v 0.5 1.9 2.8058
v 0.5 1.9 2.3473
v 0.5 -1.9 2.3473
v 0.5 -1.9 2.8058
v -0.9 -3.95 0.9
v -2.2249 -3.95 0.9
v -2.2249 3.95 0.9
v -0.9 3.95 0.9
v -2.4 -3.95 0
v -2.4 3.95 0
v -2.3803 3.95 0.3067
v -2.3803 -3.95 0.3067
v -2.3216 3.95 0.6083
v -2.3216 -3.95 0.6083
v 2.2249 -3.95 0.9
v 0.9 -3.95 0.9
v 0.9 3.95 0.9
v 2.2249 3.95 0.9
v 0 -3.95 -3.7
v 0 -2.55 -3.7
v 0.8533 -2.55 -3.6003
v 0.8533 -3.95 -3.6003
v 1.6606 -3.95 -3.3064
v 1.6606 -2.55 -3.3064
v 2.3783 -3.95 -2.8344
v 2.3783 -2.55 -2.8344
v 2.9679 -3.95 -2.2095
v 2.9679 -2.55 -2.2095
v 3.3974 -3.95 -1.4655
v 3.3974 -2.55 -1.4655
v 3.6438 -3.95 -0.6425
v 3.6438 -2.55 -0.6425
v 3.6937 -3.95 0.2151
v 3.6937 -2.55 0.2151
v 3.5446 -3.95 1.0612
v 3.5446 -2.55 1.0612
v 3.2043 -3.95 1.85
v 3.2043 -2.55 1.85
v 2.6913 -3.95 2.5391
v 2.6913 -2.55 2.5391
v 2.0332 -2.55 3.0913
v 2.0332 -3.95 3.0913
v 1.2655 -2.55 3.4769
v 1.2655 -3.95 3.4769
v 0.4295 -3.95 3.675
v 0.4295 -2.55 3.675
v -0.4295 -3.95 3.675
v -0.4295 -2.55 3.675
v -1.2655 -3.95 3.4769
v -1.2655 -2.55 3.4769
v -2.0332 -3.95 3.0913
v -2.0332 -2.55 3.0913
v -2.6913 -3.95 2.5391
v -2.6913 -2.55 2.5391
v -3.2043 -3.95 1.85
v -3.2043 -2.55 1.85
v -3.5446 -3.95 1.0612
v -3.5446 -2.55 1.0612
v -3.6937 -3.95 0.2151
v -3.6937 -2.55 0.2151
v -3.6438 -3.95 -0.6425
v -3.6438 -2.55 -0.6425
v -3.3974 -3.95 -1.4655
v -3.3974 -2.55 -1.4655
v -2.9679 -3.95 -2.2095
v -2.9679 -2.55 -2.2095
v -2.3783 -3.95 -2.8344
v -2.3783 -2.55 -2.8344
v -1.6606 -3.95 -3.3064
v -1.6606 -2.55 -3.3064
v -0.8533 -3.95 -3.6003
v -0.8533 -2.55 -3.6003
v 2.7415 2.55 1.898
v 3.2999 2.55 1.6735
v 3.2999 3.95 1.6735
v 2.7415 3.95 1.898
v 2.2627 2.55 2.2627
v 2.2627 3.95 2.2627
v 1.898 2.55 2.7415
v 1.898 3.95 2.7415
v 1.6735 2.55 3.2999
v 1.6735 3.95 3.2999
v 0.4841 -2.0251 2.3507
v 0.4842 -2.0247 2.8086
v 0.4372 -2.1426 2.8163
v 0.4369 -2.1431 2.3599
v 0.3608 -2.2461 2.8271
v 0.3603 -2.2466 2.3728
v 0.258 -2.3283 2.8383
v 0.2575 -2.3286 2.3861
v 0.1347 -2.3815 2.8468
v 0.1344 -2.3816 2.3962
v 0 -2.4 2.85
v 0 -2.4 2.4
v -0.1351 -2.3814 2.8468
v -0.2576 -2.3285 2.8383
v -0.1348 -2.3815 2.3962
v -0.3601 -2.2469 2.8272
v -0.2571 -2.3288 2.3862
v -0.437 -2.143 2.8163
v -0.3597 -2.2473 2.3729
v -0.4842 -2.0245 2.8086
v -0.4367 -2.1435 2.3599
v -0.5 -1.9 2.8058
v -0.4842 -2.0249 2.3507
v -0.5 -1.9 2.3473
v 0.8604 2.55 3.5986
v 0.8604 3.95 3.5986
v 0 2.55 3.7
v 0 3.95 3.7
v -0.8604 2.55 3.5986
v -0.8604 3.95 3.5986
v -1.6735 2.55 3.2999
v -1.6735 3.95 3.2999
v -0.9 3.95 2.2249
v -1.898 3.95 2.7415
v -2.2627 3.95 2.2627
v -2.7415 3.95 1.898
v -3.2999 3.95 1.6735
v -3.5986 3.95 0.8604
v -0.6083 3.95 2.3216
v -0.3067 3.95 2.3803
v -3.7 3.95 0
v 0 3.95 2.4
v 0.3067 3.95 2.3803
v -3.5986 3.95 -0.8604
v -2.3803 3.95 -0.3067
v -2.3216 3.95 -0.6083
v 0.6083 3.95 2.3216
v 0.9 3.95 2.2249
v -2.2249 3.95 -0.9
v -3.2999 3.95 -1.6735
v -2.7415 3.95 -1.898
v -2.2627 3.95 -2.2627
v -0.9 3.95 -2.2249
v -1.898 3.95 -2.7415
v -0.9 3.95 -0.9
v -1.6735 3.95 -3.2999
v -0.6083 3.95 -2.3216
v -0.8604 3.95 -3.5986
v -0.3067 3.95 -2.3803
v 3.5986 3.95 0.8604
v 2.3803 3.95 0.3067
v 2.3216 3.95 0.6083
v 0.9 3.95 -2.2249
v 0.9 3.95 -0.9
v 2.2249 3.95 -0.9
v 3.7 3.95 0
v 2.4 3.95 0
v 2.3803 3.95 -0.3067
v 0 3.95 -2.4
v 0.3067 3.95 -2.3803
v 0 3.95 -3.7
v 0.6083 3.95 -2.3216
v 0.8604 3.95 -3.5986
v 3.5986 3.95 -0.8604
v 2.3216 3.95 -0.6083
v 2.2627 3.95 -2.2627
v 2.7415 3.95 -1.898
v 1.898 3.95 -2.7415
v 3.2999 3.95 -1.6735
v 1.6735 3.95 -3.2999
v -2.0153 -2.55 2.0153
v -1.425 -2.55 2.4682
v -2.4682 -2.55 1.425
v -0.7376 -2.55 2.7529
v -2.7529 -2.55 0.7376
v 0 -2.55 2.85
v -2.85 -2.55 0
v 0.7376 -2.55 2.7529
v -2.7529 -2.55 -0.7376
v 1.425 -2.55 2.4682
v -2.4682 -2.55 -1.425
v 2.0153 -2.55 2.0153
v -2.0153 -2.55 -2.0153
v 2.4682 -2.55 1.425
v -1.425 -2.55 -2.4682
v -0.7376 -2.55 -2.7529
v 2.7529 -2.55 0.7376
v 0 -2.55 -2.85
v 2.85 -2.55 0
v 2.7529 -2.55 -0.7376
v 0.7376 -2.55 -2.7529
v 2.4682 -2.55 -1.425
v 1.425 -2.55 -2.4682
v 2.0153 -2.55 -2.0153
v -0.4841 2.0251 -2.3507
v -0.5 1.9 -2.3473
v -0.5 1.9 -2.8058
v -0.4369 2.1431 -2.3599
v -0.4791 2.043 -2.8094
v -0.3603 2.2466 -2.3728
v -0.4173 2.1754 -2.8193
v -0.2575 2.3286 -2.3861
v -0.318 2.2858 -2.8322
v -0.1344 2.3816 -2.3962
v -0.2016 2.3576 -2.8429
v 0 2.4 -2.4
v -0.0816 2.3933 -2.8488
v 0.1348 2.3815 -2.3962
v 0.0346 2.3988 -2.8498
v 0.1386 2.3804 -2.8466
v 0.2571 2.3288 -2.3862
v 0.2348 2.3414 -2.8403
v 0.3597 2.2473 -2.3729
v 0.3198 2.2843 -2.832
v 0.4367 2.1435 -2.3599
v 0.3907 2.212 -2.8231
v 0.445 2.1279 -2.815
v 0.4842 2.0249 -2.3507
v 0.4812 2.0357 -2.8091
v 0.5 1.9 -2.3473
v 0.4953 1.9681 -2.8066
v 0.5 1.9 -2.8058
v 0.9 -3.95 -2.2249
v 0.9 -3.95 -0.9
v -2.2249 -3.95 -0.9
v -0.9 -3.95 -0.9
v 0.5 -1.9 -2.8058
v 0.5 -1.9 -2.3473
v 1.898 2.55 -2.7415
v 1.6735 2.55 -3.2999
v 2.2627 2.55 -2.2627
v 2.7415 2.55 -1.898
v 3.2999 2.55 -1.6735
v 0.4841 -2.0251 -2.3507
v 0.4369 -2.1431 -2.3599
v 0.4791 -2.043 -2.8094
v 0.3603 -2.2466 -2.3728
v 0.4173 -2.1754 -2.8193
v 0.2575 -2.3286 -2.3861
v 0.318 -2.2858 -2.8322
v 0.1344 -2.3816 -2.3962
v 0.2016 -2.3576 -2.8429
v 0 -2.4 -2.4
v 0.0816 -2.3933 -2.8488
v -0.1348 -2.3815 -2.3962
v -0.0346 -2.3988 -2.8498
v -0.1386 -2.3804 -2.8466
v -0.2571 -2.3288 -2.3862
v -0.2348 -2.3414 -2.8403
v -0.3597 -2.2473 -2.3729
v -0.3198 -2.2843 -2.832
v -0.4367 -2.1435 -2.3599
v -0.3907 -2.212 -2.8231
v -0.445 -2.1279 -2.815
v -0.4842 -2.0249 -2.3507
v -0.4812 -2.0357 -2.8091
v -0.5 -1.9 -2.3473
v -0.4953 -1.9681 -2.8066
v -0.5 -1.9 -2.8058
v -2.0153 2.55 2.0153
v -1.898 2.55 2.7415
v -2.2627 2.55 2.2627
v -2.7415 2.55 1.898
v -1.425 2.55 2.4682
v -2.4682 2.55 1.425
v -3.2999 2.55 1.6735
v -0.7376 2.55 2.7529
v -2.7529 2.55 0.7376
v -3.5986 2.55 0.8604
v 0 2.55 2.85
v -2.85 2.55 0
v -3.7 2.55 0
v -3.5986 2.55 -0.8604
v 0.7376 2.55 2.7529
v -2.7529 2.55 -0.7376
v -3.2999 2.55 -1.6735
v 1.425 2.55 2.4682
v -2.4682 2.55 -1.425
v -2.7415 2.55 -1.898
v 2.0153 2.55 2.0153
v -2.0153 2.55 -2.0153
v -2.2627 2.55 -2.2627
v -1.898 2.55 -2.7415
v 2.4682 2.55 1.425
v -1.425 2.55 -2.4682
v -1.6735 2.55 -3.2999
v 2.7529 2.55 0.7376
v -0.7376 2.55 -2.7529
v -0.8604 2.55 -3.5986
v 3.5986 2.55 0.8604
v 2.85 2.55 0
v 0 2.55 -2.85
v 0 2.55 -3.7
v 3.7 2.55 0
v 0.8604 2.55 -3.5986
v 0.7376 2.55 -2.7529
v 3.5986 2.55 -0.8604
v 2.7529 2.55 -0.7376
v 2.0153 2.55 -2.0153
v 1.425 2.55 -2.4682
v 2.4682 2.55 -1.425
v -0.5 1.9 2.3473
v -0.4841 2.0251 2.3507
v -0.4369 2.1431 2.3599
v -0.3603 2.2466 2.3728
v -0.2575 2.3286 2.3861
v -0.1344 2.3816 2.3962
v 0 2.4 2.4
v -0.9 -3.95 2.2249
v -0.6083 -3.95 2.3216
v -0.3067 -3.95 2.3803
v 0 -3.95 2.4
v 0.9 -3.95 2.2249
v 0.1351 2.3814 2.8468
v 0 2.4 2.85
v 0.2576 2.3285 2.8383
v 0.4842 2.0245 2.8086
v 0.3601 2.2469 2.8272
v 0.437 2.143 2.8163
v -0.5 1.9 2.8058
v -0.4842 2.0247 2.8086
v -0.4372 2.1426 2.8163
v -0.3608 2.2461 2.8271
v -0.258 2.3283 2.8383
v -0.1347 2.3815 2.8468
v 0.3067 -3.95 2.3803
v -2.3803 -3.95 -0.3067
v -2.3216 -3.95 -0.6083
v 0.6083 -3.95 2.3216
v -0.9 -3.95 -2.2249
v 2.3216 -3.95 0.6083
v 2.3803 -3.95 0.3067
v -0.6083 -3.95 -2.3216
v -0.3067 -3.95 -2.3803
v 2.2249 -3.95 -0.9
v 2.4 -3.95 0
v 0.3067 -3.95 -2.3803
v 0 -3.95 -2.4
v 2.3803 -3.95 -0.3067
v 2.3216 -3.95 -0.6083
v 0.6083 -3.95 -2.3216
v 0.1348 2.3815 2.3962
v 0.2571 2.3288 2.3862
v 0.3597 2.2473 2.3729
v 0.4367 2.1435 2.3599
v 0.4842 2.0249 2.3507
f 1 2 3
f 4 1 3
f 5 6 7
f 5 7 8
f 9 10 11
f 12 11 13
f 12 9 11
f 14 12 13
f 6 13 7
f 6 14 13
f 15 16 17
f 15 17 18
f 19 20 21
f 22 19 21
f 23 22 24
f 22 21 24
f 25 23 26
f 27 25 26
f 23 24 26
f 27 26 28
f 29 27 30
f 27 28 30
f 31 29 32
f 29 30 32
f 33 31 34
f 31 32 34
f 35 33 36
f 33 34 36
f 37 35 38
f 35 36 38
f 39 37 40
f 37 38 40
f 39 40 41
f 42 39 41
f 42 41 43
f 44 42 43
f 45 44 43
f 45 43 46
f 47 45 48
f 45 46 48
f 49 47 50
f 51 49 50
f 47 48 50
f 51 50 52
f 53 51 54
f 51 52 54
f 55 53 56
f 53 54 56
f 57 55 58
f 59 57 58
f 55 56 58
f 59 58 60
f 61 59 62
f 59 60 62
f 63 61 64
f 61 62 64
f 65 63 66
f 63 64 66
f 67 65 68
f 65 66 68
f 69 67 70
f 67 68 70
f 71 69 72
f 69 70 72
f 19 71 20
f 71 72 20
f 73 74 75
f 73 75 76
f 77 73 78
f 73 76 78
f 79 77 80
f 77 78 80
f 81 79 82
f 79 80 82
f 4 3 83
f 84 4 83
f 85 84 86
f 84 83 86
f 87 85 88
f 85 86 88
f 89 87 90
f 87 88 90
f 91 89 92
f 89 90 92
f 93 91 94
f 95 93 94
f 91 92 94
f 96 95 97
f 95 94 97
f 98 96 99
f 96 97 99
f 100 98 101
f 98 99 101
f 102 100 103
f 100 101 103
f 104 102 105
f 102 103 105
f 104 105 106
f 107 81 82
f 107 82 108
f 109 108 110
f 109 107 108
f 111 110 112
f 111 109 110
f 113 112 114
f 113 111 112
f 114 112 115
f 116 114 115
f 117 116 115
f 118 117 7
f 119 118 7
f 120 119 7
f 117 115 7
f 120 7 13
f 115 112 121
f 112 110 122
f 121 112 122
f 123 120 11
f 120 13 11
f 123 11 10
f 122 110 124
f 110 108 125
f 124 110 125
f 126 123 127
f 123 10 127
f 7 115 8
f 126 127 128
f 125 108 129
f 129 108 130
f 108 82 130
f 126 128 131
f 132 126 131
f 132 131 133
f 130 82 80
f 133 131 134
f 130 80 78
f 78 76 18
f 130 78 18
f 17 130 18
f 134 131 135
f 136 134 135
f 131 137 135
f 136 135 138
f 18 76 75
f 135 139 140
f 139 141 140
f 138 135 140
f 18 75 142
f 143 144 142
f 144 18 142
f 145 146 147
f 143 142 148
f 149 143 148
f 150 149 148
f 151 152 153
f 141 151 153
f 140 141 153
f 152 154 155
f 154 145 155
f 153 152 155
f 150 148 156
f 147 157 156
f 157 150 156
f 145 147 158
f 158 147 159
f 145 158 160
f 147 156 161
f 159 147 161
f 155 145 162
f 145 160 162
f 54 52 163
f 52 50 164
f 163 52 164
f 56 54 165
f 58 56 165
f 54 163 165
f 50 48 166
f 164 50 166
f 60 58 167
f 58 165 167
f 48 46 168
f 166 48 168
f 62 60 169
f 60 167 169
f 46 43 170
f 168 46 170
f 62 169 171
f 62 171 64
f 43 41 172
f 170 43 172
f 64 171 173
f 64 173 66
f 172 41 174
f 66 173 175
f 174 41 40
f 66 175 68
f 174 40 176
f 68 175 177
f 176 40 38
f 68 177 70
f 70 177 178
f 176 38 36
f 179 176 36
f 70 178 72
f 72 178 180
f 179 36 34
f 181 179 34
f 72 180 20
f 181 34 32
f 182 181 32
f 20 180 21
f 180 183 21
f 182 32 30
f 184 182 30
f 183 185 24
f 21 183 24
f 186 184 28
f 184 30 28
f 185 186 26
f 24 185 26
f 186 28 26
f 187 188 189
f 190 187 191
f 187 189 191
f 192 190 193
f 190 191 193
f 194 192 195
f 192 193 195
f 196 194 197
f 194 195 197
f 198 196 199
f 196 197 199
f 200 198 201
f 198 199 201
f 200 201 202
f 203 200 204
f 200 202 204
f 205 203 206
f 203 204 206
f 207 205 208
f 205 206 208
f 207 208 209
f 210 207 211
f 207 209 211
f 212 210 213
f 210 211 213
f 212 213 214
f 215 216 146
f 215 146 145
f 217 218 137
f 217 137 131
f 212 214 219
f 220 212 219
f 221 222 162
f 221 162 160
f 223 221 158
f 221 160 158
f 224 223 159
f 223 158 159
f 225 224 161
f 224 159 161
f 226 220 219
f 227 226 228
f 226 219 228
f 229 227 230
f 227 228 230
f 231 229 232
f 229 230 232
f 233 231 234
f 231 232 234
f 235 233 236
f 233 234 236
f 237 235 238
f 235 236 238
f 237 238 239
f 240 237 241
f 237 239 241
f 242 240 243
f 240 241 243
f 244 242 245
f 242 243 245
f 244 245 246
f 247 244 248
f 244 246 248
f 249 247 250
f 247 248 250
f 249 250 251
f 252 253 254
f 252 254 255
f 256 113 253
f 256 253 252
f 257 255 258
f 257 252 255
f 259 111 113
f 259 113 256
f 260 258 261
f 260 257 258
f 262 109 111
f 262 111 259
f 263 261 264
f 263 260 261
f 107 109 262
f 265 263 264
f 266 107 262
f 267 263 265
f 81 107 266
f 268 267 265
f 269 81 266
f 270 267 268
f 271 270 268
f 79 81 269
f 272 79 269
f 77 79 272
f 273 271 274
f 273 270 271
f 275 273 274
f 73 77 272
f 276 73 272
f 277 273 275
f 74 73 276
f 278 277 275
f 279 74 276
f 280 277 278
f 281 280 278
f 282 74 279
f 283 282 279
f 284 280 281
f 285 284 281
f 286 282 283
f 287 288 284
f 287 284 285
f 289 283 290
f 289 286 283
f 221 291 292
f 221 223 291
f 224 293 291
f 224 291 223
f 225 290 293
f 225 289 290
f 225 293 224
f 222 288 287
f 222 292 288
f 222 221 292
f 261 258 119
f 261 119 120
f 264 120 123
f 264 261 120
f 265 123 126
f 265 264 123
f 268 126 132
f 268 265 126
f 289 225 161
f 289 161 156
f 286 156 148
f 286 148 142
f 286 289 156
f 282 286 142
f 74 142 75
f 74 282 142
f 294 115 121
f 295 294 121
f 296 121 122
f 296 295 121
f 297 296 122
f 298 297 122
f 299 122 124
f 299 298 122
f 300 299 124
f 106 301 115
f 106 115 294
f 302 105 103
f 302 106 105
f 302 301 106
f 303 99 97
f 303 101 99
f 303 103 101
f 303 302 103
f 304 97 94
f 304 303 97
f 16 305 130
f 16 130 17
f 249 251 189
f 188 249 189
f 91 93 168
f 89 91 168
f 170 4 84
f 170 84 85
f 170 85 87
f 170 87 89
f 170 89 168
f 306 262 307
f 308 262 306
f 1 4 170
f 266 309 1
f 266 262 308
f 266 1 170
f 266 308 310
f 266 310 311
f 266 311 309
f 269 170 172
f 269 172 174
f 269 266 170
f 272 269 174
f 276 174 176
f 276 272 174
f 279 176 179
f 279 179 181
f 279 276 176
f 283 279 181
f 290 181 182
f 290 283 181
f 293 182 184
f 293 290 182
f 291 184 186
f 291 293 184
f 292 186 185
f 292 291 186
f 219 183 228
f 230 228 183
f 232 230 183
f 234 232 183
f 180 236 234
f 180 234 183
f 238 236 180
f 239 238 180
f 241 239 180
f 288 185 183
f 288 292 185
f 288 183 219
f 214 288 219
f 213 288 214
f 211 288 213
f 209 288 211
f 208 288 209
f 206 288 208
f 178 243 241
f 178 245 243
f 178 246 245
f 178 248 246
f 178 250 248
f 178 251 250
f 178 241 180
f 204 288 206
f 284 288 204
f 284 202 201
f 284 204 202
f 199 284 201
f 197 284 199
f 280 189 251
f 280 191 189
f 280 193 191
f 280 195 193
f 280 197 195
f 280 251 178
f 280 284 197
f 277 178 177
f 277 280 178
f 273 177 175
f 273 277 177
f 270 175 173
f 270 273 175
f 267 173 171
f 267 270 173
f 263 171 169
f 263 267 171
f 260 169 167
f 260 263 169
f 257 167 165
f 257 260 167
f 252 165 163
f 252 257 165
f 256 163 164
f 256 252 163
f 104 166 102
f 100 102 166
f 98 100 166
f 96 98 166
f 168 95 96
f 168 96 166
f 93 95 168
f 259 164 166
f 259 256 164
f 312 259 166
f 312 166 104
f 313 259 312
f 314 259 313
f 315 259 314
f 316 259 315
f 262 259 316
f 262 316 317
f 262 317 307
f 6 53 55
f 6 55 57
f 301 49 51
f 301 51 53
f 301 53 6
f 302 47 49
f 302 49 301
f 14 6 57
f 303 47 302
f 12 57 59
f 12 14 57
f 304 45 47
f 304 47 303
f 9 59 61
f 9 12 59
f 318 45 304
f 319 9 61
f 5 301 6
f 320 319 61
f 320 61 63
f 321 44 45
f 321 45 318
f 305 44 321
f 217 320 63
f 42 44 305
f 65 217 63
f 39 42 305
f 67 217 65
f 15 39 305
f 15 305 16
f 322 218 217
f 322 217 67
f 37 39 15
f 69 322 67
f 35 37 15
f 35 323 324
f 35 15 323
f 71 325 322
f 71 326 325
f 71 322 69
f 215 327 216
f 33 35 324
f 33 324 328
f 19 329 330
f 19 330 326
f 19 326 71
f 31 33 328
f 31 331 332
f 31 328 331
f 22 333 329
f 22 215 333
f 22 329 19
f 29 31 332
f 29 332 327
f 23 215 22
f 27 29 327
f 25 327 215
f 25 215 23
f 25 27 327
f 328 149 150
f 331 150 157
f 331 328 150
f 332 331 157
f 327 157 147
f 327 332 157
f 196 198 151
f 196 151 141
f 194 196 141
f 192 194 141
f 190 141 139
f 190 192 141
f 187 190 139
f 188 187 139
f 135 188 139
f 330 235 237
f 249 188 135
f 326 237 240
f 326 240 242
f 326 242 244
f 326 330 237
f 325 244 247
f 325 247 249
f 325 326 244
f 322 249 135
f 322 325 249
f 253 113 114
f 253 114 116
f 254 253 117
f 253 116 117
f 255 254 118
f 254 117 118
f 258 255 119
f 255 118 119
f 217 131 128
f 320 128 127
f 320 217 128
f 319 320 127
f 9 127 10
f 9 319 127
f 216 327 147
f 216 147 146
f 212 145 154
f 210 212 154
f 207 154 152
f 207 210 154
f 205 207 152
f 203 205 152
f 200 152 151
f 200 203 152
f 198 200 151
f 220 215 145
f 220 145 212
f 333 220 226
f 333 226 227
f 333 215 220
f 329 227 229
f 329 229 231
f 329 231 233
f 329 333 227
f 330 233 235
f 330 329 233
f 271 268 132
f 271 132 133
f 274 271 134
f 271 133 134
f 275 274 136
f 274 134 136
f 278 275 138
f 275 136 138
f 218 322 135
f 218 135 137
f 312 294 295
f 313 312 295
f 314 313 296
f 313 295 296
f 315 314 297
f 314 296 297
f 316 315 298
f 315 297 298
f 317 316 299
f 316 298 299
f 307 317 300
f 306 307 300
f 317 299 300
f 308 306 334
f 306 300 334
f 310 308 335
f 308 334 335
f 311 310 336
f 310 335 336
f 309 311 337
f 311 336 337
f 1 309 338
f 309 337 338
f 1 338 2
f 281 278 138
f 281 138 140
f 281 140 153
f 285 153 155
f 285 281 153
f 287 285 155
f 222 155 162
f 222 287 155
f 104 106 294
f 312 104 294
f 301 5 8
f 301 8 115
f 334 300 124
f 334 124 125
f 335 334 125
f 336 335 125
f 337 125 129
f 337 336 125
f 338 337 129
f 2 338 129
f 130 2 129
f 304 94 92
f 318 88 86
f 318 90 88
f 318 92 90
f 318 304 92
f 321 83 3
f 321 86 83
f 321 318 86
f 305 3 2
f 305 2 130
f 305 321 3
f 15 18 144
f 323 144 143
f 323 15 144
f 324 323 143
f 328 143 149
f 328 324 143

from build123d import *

# Parameters (mm, degrees)
SKETCH1_R           = 2.85
MIDDLE_BODY_DEPTH   = 2.55
SKETCH2_R           = 3.7
OUTER_RIM_DEPTH     = 1.4
AXLE_CUT_DEPTH      = 7.556104026
AXLE_CUT_DEPTH_BACK = 7.556104026
SKETCH3_W           = 1.8
SKETCH3_H           = 1.8
SLOT_CUT_DEPTH      = 7.556104026
SLOT_CUT_DEPTH_BACK = 7.556104026
SKETCH5_R           = 2.24600999
SCALLOP_CUT_DEPTH   = 1.4


with BuildPart() as part:
    # Sketch1 → Middle Body (new, symmetric)
    with BuildSketch(Plane(origin=(0, 0, 0), x_dir=(1, 0, 0), z_dir=(0, 1, 0))):
        with Locations(Location((0, 0, 0), (0, 0, 270))):
            Circle(SKETCH1_R)
    extrude(amount=MIDDLE_BODY_DEPTH, both=True)

    # Sketch2 → Outer Rim (add)
    with BuildSketch(Plane.XZ.offset(2.55)):
        with Locations(Location((0, 0, 0), (0, 0, 270))):
            Circle(SKETCH2_R)
    outer_rim = extrude(amount=OUTER_RIM_DEPTH)

    # Mirror1: Outer Rim across plane
    add(outer_rim.mirror(Plane.ZX))

    # Sketch3 → Axle Cut (cut, two sides: drawn at the far end of the back side and taken through both)
    with BuildSketch(Plane(origin=(0, 0, 0), x_dir=(1, 0, 0), z_dir=(0, 1, 0)).offset(-AXLE_CUT_DEPTH_BACK)):
        with BuildLine():
            Line((-0.9, 0.9), (0.9, 0.9))
            Line((0.9, 0.9), (0.9, 2.224859546))
            ThreePointArc((0.9, 2.224859546), (0.45844143, 2.355808026), (0, 2.4))
            ThreePointArc((0, 2.4), (-0.45844143, 2.355808026), (-0.9, 2.224859546))
            Line((-0.9, 2.224859546), (-0.9, 0.9))
        make_face()
        with BuildLine():
            Line((-2.224859546, -0.9), (-0.9, -0.9))
            Line((-0.9, -0.9), (-0.9, 0.9))
            Line((-0.9, 0.9), (-2.224859546, 0.9))
            ThreePointArc((-2.224859546, 0.9), (-2.355808026, 0.45844143), (-2.4, 0))
            ThreePointArc((-2.4, 0), (-2.355808026, -0.45844143), (-2.224859546, -0.9))
        make_face()
        Rectangle(SKETCH3_W, SKETCH3_H)
        with BuildLine():
            Line((0.9, -2.224859546), (0.9, -0.9))
            Line((0.9, -0.9), (-0.9, -0.9))
            Line((-0.9, -0.9), (-0.9, -2.224859546))
            ThreePointArc((-0.9, -2.224859546), (-0.45844143, -2.355808026), (0, -2.4))
            ThreePointArc((0, -2.4), (0.45844143, -2.355808026), (0.9, -2.224859546))
        make_face()
        with BuildLine():
            Line((0.9, -0.9), (2.224859546, -0.9))
            ThreePointArc((2.224859546, -0.9), (2.355808026, -0.45844143), (2.4, 0))
            ThreePointArc((2.4, 0), (2.355808026, 0.45844143), (2.224859546, 0.9))
            Line((2.224859546, 0.9), (0.9, 0.9))
            Line((0.9, 0.9), (0.9, -0.9))
        make_face()
    extrude(amount=AXLE_CUT_DEPTH + AXLE_CUT_DEPTH_BACK, mode=Mode.SUBTRACT)

    # Sketch4 → Slot Cut (cut, two sides: drawn at the far end of the back side and taken through both)
    with BuildSketch(Plane.XY.offset(-SLOT_CUT_DEPTH_BACK)):
        with BuildLine():
            Line((-0.5, -1.9), (-0.5, 1.9))
            ThreePointArc((-0.5, 1.9), (0, 2.4), (0.5, 1.9))
            Line((0.5, 1.9), (0.5, -1.9))
            ThreePointArc((0.5, -1.9), (0, -2.4), (-0.5, -1.9))
        make_face()
    extrude(amount=SLOT_CUT_DEPTH + SLOT_CUT_DEPTH_BACK, mode=Mode.SUBTRACT)

    # Sketch5 → Scallop Cut (cut)
    with BuildSketch(Plane(origin=(0, 3.95, 0), x_dir=(1, 0, 0), z_dir=(0, 1, 0))):
        with Locations((3.850910595, 3.850910595)):
            Circle(SKETCH5_R)
        with Locations((3.850910595, -3.850910595)):
            Circle(SKETCH5_R)
        with Locations((-3.850910595, -3.850910595)):
            Circle(SKETCH5_R)
        with Locations((-3.850910595, 3.850910595)):
            Circle(SKETCH5_R)
    extrude(amount=-SCALLOP_CUT_DEPTH, mode=Mode.SUBTRACT)


solid = part.part
